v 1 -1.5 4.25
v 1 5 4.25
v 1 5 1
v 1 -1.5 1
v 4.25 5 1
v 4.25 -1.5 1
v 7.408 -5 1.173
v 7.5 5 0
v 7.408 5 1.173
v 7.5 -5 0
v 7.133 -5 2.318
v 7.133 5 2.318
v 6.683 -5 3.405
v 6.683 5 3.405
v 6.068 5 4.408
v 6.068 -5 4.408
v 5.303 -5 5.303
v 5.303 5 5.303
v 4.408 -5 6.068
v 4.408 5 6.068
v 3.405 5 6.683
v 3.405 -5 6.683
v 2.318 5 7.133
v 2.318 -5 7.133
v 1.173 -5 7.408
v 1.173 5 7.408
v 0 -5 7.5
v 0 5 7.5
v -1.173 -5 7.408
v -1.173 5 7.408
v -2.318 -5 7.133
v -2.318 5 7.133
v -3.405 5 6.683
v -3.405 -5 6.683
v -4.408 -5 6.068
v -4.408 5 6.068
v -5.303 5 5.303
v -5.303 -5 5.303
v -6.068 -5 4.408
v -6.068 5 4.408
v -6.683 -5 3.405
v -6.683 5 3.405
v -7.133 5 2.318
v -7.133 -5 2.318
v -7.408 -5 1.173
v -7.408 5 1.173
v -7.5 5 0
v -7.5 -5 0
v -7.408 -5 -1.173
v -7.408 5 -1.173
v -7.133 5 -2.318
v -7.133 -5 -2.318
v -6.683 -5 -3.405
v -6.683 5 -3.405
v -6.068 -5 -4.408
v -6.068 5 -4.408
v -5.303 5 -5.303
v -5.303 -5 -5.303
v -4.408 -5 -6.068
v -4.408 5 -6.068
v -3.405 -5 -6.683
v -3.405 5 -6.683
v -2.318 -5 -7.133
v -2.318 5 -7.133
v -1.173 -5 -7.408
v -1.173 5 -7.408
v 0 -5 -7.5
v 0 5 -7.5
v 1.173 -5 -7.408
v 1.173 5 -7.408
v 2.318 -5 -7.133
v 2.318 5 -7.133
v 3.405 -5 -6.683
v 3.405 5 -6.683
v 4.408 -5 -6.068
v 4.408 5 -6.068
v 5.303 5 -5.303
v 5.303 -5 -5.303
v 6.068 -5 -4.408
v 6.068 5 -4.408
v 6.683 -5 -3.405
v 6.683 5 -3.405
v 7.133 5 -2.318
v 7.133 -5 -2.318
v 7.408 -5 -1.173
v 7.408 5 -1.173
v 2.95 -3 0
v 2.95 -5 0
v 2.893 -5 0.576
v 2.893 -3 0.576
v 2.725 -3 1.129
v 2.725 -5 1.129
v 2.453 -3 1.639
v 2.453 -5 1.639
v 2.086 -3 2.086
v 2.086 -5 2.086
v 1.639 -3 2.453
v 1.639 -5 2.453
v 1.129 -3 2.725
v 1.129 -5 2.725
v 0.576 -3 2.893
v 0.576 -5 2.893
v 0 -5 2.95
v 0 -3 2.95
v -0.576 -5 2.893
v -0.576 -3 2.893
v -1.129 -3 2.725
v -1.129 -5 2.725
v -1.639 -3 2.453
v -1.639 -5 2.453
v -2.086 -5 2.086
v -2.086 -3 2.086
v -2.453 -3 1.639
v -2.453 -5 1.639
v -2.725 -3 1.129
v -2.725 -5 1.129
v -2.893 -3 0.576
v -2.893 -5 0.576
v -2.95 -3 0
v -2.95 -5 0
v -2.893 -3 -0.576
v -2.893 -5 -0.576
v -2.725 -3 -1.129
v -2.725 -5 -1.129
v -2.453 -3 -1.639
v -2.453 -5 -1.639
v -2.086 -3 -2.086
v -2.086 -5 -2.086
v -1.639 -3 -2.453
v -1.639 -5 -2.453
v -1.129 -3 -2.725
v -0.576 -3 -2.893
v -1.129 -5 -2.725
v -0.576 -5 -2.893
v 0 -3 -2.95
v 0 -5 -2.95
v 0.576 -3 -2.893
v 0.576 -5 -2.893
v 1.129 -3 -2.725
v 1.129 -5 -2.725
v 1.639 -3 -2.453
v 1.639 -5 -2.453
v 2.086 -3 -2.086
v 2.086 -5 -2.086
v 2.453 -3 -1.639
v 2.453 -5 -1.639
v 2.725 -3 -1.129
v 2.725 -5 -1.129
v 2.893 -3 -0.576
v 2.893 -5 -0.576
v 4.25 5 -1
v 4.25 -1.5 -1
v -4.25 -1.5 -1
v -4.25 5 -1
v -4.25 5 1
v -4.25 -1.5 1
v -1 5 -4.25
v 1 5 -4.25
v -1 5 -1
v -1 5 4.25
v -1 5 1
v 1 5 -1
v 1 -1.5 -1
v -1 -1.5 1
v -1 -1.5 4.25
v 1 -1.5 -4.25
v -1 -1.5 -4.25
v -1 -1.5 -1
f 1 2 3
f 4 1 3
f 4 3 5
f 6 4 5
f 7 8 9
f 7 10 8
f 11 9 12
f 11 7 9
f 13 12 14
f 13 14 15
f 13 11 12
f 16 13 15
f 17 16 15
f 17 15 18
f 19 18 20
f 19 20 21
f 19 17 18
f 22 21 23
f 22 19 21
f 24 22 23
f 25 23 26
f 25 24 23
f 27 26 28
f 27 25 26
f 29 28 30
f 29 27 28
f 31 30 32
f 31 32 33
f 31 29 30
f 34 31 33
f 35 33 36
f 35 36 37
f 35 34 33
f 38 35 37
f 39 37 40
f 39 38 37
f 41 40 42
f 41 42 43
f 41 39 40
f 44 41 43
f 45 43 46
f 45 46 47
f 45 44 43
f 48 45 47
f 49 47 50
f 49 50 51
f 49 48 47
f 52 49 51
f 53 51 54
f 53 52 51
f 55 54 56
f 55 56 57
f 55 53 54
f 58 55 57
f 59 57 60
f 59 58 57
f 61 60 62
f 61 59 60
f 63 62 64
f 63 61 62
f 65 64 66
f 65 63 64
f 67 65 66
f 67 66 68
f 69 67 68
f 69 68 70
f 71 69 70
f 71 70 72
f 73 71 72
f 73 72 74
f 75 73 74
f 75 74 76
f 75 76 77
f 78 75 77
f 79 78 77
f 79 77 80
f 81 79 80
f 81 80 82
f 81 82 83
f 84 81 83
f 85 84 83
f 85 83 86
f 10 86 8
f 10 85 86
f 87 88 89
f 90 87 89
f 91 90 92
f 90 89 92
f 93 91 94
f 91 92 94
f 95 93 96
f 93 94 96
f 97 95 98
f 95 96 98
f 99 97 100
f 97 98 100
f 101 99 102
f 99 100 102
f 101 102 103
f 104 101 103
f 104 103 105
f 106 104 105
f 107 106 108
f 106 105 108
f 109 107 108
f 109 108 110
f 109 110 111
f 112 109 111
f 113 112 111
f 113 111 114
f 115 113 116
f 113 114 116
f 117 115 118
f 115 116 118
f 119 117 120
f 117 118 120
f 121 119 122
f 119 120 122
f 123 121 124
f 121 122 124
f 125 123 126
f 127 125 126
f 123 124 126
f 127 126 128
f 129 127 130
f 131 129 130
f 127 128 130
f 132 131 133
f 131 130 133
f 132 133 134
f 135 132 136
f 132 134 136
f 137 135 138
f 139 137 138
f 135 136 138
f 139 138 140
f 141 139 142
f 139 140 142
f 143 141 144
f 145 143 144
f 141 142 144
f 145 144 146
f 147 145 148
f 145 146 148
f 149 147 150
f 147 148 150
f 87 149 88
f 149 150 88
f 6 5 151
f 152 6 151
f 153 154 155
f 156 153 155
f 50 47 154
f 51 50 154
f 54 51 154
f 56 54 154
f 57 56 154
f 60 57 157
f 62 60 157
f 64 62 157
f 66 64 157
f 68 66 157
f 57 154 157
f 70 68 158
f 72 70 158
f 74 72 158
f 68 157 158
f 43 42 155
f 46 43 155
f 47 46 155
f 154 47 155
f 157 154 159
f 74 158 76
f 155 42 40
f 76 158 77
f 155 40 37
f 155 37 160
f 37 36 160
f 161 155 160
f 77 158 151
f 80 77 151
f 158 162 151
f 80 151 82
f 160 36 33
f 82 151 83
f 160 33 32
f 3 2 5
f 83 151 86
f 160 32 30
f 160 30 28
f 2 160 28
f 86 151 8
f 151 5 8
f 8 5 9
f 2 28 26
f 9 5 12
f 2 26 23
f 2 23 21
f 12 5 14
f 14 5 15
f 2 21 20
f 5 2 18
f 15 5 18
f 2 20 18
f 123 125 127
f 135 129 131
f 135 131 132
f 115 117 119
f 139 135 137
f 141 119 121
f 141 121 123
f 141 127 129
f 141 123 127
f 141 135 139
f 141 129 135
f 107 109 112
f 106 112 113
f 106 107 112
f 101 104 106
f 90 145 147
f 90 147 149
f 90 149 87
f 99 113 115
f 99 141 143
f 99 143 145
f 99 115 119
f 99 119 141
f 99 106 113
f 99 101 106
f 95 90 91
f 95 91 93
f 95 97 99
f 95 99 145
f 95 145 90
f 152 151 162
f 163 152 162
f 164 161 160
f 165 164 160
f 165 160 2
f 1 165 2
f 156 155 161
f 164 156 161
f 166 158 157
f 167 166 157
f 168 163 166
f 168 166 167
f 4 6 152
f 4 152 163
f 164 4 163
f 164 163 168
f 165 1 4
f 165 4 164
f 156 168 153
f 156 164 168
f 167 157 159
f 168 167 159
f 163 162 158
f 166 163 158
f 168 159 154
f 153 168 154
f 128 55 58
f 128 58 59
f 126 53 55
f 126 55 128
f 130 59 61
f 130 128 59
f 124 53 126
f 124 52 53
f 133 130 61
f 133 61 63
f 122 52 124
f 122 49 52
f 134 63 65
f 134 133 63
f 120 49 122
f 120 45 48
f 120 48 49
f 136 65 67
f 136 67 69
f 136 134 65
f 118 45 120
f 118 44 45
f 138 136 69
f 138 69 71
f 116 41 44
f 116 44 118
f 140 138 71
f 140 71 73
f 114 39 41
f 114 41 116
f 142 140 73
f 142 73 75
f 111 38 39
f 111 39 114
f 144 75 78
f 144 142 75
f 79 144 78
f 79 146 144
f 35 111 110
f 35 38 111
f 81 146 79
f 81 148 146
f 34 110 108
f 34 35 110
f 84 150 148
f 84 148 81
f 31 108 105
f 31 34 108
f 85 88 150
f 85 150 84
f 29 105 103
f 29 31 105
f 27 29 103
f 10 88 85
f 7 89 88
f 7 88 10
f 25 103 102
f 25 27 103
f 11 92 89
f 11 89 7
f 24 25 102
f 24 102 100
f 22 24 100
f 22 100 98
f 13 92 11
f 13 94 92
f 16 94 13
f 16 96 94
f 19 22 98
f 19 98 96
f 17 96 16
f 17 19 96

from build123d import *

# Parameters (mm, degrees)
F0_R     = 7.5
F1_DEPTH = 5
F2_R     = 2.95
F3_DEPTH = 2
F5_DEPTH = 6.5


with BuildPart() as f1:
    # F0 (on Front) → F1 (new body, symmetric)
    with BuildSketch(Plane.XZ):
        Circle(F0_R)
    extrude(amount=F1_DEPTH, both=True)

    # F2 (on face) → F3 (cut)
    with BuildSketch(Plane.XZ.offset(5)):
        Circle(F2_R)
    extrude(amount=-F3_DEPTH, mode=Mode.SUBTRACT)

    # F4 (on face) → F5 (cut)
    with BuildSketch(Plane(origin=(0, 5, 0), x_dir=(-1, 0, 0), z_dir=(0, 1, 0))):
        Polygon((1, 4.25), (-1, 4.25), (-1, 1), (-4.25, 1), (-4.25, -1), (-1, -1), (-1, -4.25), (1, -4.25), (1, -1), (4.25, -1), (4.25, 1), (1, 1), align=None)
    extrude(amount=-F5_DEPTH, mode=Mode.SUBTRACT)


solid = f1.part
